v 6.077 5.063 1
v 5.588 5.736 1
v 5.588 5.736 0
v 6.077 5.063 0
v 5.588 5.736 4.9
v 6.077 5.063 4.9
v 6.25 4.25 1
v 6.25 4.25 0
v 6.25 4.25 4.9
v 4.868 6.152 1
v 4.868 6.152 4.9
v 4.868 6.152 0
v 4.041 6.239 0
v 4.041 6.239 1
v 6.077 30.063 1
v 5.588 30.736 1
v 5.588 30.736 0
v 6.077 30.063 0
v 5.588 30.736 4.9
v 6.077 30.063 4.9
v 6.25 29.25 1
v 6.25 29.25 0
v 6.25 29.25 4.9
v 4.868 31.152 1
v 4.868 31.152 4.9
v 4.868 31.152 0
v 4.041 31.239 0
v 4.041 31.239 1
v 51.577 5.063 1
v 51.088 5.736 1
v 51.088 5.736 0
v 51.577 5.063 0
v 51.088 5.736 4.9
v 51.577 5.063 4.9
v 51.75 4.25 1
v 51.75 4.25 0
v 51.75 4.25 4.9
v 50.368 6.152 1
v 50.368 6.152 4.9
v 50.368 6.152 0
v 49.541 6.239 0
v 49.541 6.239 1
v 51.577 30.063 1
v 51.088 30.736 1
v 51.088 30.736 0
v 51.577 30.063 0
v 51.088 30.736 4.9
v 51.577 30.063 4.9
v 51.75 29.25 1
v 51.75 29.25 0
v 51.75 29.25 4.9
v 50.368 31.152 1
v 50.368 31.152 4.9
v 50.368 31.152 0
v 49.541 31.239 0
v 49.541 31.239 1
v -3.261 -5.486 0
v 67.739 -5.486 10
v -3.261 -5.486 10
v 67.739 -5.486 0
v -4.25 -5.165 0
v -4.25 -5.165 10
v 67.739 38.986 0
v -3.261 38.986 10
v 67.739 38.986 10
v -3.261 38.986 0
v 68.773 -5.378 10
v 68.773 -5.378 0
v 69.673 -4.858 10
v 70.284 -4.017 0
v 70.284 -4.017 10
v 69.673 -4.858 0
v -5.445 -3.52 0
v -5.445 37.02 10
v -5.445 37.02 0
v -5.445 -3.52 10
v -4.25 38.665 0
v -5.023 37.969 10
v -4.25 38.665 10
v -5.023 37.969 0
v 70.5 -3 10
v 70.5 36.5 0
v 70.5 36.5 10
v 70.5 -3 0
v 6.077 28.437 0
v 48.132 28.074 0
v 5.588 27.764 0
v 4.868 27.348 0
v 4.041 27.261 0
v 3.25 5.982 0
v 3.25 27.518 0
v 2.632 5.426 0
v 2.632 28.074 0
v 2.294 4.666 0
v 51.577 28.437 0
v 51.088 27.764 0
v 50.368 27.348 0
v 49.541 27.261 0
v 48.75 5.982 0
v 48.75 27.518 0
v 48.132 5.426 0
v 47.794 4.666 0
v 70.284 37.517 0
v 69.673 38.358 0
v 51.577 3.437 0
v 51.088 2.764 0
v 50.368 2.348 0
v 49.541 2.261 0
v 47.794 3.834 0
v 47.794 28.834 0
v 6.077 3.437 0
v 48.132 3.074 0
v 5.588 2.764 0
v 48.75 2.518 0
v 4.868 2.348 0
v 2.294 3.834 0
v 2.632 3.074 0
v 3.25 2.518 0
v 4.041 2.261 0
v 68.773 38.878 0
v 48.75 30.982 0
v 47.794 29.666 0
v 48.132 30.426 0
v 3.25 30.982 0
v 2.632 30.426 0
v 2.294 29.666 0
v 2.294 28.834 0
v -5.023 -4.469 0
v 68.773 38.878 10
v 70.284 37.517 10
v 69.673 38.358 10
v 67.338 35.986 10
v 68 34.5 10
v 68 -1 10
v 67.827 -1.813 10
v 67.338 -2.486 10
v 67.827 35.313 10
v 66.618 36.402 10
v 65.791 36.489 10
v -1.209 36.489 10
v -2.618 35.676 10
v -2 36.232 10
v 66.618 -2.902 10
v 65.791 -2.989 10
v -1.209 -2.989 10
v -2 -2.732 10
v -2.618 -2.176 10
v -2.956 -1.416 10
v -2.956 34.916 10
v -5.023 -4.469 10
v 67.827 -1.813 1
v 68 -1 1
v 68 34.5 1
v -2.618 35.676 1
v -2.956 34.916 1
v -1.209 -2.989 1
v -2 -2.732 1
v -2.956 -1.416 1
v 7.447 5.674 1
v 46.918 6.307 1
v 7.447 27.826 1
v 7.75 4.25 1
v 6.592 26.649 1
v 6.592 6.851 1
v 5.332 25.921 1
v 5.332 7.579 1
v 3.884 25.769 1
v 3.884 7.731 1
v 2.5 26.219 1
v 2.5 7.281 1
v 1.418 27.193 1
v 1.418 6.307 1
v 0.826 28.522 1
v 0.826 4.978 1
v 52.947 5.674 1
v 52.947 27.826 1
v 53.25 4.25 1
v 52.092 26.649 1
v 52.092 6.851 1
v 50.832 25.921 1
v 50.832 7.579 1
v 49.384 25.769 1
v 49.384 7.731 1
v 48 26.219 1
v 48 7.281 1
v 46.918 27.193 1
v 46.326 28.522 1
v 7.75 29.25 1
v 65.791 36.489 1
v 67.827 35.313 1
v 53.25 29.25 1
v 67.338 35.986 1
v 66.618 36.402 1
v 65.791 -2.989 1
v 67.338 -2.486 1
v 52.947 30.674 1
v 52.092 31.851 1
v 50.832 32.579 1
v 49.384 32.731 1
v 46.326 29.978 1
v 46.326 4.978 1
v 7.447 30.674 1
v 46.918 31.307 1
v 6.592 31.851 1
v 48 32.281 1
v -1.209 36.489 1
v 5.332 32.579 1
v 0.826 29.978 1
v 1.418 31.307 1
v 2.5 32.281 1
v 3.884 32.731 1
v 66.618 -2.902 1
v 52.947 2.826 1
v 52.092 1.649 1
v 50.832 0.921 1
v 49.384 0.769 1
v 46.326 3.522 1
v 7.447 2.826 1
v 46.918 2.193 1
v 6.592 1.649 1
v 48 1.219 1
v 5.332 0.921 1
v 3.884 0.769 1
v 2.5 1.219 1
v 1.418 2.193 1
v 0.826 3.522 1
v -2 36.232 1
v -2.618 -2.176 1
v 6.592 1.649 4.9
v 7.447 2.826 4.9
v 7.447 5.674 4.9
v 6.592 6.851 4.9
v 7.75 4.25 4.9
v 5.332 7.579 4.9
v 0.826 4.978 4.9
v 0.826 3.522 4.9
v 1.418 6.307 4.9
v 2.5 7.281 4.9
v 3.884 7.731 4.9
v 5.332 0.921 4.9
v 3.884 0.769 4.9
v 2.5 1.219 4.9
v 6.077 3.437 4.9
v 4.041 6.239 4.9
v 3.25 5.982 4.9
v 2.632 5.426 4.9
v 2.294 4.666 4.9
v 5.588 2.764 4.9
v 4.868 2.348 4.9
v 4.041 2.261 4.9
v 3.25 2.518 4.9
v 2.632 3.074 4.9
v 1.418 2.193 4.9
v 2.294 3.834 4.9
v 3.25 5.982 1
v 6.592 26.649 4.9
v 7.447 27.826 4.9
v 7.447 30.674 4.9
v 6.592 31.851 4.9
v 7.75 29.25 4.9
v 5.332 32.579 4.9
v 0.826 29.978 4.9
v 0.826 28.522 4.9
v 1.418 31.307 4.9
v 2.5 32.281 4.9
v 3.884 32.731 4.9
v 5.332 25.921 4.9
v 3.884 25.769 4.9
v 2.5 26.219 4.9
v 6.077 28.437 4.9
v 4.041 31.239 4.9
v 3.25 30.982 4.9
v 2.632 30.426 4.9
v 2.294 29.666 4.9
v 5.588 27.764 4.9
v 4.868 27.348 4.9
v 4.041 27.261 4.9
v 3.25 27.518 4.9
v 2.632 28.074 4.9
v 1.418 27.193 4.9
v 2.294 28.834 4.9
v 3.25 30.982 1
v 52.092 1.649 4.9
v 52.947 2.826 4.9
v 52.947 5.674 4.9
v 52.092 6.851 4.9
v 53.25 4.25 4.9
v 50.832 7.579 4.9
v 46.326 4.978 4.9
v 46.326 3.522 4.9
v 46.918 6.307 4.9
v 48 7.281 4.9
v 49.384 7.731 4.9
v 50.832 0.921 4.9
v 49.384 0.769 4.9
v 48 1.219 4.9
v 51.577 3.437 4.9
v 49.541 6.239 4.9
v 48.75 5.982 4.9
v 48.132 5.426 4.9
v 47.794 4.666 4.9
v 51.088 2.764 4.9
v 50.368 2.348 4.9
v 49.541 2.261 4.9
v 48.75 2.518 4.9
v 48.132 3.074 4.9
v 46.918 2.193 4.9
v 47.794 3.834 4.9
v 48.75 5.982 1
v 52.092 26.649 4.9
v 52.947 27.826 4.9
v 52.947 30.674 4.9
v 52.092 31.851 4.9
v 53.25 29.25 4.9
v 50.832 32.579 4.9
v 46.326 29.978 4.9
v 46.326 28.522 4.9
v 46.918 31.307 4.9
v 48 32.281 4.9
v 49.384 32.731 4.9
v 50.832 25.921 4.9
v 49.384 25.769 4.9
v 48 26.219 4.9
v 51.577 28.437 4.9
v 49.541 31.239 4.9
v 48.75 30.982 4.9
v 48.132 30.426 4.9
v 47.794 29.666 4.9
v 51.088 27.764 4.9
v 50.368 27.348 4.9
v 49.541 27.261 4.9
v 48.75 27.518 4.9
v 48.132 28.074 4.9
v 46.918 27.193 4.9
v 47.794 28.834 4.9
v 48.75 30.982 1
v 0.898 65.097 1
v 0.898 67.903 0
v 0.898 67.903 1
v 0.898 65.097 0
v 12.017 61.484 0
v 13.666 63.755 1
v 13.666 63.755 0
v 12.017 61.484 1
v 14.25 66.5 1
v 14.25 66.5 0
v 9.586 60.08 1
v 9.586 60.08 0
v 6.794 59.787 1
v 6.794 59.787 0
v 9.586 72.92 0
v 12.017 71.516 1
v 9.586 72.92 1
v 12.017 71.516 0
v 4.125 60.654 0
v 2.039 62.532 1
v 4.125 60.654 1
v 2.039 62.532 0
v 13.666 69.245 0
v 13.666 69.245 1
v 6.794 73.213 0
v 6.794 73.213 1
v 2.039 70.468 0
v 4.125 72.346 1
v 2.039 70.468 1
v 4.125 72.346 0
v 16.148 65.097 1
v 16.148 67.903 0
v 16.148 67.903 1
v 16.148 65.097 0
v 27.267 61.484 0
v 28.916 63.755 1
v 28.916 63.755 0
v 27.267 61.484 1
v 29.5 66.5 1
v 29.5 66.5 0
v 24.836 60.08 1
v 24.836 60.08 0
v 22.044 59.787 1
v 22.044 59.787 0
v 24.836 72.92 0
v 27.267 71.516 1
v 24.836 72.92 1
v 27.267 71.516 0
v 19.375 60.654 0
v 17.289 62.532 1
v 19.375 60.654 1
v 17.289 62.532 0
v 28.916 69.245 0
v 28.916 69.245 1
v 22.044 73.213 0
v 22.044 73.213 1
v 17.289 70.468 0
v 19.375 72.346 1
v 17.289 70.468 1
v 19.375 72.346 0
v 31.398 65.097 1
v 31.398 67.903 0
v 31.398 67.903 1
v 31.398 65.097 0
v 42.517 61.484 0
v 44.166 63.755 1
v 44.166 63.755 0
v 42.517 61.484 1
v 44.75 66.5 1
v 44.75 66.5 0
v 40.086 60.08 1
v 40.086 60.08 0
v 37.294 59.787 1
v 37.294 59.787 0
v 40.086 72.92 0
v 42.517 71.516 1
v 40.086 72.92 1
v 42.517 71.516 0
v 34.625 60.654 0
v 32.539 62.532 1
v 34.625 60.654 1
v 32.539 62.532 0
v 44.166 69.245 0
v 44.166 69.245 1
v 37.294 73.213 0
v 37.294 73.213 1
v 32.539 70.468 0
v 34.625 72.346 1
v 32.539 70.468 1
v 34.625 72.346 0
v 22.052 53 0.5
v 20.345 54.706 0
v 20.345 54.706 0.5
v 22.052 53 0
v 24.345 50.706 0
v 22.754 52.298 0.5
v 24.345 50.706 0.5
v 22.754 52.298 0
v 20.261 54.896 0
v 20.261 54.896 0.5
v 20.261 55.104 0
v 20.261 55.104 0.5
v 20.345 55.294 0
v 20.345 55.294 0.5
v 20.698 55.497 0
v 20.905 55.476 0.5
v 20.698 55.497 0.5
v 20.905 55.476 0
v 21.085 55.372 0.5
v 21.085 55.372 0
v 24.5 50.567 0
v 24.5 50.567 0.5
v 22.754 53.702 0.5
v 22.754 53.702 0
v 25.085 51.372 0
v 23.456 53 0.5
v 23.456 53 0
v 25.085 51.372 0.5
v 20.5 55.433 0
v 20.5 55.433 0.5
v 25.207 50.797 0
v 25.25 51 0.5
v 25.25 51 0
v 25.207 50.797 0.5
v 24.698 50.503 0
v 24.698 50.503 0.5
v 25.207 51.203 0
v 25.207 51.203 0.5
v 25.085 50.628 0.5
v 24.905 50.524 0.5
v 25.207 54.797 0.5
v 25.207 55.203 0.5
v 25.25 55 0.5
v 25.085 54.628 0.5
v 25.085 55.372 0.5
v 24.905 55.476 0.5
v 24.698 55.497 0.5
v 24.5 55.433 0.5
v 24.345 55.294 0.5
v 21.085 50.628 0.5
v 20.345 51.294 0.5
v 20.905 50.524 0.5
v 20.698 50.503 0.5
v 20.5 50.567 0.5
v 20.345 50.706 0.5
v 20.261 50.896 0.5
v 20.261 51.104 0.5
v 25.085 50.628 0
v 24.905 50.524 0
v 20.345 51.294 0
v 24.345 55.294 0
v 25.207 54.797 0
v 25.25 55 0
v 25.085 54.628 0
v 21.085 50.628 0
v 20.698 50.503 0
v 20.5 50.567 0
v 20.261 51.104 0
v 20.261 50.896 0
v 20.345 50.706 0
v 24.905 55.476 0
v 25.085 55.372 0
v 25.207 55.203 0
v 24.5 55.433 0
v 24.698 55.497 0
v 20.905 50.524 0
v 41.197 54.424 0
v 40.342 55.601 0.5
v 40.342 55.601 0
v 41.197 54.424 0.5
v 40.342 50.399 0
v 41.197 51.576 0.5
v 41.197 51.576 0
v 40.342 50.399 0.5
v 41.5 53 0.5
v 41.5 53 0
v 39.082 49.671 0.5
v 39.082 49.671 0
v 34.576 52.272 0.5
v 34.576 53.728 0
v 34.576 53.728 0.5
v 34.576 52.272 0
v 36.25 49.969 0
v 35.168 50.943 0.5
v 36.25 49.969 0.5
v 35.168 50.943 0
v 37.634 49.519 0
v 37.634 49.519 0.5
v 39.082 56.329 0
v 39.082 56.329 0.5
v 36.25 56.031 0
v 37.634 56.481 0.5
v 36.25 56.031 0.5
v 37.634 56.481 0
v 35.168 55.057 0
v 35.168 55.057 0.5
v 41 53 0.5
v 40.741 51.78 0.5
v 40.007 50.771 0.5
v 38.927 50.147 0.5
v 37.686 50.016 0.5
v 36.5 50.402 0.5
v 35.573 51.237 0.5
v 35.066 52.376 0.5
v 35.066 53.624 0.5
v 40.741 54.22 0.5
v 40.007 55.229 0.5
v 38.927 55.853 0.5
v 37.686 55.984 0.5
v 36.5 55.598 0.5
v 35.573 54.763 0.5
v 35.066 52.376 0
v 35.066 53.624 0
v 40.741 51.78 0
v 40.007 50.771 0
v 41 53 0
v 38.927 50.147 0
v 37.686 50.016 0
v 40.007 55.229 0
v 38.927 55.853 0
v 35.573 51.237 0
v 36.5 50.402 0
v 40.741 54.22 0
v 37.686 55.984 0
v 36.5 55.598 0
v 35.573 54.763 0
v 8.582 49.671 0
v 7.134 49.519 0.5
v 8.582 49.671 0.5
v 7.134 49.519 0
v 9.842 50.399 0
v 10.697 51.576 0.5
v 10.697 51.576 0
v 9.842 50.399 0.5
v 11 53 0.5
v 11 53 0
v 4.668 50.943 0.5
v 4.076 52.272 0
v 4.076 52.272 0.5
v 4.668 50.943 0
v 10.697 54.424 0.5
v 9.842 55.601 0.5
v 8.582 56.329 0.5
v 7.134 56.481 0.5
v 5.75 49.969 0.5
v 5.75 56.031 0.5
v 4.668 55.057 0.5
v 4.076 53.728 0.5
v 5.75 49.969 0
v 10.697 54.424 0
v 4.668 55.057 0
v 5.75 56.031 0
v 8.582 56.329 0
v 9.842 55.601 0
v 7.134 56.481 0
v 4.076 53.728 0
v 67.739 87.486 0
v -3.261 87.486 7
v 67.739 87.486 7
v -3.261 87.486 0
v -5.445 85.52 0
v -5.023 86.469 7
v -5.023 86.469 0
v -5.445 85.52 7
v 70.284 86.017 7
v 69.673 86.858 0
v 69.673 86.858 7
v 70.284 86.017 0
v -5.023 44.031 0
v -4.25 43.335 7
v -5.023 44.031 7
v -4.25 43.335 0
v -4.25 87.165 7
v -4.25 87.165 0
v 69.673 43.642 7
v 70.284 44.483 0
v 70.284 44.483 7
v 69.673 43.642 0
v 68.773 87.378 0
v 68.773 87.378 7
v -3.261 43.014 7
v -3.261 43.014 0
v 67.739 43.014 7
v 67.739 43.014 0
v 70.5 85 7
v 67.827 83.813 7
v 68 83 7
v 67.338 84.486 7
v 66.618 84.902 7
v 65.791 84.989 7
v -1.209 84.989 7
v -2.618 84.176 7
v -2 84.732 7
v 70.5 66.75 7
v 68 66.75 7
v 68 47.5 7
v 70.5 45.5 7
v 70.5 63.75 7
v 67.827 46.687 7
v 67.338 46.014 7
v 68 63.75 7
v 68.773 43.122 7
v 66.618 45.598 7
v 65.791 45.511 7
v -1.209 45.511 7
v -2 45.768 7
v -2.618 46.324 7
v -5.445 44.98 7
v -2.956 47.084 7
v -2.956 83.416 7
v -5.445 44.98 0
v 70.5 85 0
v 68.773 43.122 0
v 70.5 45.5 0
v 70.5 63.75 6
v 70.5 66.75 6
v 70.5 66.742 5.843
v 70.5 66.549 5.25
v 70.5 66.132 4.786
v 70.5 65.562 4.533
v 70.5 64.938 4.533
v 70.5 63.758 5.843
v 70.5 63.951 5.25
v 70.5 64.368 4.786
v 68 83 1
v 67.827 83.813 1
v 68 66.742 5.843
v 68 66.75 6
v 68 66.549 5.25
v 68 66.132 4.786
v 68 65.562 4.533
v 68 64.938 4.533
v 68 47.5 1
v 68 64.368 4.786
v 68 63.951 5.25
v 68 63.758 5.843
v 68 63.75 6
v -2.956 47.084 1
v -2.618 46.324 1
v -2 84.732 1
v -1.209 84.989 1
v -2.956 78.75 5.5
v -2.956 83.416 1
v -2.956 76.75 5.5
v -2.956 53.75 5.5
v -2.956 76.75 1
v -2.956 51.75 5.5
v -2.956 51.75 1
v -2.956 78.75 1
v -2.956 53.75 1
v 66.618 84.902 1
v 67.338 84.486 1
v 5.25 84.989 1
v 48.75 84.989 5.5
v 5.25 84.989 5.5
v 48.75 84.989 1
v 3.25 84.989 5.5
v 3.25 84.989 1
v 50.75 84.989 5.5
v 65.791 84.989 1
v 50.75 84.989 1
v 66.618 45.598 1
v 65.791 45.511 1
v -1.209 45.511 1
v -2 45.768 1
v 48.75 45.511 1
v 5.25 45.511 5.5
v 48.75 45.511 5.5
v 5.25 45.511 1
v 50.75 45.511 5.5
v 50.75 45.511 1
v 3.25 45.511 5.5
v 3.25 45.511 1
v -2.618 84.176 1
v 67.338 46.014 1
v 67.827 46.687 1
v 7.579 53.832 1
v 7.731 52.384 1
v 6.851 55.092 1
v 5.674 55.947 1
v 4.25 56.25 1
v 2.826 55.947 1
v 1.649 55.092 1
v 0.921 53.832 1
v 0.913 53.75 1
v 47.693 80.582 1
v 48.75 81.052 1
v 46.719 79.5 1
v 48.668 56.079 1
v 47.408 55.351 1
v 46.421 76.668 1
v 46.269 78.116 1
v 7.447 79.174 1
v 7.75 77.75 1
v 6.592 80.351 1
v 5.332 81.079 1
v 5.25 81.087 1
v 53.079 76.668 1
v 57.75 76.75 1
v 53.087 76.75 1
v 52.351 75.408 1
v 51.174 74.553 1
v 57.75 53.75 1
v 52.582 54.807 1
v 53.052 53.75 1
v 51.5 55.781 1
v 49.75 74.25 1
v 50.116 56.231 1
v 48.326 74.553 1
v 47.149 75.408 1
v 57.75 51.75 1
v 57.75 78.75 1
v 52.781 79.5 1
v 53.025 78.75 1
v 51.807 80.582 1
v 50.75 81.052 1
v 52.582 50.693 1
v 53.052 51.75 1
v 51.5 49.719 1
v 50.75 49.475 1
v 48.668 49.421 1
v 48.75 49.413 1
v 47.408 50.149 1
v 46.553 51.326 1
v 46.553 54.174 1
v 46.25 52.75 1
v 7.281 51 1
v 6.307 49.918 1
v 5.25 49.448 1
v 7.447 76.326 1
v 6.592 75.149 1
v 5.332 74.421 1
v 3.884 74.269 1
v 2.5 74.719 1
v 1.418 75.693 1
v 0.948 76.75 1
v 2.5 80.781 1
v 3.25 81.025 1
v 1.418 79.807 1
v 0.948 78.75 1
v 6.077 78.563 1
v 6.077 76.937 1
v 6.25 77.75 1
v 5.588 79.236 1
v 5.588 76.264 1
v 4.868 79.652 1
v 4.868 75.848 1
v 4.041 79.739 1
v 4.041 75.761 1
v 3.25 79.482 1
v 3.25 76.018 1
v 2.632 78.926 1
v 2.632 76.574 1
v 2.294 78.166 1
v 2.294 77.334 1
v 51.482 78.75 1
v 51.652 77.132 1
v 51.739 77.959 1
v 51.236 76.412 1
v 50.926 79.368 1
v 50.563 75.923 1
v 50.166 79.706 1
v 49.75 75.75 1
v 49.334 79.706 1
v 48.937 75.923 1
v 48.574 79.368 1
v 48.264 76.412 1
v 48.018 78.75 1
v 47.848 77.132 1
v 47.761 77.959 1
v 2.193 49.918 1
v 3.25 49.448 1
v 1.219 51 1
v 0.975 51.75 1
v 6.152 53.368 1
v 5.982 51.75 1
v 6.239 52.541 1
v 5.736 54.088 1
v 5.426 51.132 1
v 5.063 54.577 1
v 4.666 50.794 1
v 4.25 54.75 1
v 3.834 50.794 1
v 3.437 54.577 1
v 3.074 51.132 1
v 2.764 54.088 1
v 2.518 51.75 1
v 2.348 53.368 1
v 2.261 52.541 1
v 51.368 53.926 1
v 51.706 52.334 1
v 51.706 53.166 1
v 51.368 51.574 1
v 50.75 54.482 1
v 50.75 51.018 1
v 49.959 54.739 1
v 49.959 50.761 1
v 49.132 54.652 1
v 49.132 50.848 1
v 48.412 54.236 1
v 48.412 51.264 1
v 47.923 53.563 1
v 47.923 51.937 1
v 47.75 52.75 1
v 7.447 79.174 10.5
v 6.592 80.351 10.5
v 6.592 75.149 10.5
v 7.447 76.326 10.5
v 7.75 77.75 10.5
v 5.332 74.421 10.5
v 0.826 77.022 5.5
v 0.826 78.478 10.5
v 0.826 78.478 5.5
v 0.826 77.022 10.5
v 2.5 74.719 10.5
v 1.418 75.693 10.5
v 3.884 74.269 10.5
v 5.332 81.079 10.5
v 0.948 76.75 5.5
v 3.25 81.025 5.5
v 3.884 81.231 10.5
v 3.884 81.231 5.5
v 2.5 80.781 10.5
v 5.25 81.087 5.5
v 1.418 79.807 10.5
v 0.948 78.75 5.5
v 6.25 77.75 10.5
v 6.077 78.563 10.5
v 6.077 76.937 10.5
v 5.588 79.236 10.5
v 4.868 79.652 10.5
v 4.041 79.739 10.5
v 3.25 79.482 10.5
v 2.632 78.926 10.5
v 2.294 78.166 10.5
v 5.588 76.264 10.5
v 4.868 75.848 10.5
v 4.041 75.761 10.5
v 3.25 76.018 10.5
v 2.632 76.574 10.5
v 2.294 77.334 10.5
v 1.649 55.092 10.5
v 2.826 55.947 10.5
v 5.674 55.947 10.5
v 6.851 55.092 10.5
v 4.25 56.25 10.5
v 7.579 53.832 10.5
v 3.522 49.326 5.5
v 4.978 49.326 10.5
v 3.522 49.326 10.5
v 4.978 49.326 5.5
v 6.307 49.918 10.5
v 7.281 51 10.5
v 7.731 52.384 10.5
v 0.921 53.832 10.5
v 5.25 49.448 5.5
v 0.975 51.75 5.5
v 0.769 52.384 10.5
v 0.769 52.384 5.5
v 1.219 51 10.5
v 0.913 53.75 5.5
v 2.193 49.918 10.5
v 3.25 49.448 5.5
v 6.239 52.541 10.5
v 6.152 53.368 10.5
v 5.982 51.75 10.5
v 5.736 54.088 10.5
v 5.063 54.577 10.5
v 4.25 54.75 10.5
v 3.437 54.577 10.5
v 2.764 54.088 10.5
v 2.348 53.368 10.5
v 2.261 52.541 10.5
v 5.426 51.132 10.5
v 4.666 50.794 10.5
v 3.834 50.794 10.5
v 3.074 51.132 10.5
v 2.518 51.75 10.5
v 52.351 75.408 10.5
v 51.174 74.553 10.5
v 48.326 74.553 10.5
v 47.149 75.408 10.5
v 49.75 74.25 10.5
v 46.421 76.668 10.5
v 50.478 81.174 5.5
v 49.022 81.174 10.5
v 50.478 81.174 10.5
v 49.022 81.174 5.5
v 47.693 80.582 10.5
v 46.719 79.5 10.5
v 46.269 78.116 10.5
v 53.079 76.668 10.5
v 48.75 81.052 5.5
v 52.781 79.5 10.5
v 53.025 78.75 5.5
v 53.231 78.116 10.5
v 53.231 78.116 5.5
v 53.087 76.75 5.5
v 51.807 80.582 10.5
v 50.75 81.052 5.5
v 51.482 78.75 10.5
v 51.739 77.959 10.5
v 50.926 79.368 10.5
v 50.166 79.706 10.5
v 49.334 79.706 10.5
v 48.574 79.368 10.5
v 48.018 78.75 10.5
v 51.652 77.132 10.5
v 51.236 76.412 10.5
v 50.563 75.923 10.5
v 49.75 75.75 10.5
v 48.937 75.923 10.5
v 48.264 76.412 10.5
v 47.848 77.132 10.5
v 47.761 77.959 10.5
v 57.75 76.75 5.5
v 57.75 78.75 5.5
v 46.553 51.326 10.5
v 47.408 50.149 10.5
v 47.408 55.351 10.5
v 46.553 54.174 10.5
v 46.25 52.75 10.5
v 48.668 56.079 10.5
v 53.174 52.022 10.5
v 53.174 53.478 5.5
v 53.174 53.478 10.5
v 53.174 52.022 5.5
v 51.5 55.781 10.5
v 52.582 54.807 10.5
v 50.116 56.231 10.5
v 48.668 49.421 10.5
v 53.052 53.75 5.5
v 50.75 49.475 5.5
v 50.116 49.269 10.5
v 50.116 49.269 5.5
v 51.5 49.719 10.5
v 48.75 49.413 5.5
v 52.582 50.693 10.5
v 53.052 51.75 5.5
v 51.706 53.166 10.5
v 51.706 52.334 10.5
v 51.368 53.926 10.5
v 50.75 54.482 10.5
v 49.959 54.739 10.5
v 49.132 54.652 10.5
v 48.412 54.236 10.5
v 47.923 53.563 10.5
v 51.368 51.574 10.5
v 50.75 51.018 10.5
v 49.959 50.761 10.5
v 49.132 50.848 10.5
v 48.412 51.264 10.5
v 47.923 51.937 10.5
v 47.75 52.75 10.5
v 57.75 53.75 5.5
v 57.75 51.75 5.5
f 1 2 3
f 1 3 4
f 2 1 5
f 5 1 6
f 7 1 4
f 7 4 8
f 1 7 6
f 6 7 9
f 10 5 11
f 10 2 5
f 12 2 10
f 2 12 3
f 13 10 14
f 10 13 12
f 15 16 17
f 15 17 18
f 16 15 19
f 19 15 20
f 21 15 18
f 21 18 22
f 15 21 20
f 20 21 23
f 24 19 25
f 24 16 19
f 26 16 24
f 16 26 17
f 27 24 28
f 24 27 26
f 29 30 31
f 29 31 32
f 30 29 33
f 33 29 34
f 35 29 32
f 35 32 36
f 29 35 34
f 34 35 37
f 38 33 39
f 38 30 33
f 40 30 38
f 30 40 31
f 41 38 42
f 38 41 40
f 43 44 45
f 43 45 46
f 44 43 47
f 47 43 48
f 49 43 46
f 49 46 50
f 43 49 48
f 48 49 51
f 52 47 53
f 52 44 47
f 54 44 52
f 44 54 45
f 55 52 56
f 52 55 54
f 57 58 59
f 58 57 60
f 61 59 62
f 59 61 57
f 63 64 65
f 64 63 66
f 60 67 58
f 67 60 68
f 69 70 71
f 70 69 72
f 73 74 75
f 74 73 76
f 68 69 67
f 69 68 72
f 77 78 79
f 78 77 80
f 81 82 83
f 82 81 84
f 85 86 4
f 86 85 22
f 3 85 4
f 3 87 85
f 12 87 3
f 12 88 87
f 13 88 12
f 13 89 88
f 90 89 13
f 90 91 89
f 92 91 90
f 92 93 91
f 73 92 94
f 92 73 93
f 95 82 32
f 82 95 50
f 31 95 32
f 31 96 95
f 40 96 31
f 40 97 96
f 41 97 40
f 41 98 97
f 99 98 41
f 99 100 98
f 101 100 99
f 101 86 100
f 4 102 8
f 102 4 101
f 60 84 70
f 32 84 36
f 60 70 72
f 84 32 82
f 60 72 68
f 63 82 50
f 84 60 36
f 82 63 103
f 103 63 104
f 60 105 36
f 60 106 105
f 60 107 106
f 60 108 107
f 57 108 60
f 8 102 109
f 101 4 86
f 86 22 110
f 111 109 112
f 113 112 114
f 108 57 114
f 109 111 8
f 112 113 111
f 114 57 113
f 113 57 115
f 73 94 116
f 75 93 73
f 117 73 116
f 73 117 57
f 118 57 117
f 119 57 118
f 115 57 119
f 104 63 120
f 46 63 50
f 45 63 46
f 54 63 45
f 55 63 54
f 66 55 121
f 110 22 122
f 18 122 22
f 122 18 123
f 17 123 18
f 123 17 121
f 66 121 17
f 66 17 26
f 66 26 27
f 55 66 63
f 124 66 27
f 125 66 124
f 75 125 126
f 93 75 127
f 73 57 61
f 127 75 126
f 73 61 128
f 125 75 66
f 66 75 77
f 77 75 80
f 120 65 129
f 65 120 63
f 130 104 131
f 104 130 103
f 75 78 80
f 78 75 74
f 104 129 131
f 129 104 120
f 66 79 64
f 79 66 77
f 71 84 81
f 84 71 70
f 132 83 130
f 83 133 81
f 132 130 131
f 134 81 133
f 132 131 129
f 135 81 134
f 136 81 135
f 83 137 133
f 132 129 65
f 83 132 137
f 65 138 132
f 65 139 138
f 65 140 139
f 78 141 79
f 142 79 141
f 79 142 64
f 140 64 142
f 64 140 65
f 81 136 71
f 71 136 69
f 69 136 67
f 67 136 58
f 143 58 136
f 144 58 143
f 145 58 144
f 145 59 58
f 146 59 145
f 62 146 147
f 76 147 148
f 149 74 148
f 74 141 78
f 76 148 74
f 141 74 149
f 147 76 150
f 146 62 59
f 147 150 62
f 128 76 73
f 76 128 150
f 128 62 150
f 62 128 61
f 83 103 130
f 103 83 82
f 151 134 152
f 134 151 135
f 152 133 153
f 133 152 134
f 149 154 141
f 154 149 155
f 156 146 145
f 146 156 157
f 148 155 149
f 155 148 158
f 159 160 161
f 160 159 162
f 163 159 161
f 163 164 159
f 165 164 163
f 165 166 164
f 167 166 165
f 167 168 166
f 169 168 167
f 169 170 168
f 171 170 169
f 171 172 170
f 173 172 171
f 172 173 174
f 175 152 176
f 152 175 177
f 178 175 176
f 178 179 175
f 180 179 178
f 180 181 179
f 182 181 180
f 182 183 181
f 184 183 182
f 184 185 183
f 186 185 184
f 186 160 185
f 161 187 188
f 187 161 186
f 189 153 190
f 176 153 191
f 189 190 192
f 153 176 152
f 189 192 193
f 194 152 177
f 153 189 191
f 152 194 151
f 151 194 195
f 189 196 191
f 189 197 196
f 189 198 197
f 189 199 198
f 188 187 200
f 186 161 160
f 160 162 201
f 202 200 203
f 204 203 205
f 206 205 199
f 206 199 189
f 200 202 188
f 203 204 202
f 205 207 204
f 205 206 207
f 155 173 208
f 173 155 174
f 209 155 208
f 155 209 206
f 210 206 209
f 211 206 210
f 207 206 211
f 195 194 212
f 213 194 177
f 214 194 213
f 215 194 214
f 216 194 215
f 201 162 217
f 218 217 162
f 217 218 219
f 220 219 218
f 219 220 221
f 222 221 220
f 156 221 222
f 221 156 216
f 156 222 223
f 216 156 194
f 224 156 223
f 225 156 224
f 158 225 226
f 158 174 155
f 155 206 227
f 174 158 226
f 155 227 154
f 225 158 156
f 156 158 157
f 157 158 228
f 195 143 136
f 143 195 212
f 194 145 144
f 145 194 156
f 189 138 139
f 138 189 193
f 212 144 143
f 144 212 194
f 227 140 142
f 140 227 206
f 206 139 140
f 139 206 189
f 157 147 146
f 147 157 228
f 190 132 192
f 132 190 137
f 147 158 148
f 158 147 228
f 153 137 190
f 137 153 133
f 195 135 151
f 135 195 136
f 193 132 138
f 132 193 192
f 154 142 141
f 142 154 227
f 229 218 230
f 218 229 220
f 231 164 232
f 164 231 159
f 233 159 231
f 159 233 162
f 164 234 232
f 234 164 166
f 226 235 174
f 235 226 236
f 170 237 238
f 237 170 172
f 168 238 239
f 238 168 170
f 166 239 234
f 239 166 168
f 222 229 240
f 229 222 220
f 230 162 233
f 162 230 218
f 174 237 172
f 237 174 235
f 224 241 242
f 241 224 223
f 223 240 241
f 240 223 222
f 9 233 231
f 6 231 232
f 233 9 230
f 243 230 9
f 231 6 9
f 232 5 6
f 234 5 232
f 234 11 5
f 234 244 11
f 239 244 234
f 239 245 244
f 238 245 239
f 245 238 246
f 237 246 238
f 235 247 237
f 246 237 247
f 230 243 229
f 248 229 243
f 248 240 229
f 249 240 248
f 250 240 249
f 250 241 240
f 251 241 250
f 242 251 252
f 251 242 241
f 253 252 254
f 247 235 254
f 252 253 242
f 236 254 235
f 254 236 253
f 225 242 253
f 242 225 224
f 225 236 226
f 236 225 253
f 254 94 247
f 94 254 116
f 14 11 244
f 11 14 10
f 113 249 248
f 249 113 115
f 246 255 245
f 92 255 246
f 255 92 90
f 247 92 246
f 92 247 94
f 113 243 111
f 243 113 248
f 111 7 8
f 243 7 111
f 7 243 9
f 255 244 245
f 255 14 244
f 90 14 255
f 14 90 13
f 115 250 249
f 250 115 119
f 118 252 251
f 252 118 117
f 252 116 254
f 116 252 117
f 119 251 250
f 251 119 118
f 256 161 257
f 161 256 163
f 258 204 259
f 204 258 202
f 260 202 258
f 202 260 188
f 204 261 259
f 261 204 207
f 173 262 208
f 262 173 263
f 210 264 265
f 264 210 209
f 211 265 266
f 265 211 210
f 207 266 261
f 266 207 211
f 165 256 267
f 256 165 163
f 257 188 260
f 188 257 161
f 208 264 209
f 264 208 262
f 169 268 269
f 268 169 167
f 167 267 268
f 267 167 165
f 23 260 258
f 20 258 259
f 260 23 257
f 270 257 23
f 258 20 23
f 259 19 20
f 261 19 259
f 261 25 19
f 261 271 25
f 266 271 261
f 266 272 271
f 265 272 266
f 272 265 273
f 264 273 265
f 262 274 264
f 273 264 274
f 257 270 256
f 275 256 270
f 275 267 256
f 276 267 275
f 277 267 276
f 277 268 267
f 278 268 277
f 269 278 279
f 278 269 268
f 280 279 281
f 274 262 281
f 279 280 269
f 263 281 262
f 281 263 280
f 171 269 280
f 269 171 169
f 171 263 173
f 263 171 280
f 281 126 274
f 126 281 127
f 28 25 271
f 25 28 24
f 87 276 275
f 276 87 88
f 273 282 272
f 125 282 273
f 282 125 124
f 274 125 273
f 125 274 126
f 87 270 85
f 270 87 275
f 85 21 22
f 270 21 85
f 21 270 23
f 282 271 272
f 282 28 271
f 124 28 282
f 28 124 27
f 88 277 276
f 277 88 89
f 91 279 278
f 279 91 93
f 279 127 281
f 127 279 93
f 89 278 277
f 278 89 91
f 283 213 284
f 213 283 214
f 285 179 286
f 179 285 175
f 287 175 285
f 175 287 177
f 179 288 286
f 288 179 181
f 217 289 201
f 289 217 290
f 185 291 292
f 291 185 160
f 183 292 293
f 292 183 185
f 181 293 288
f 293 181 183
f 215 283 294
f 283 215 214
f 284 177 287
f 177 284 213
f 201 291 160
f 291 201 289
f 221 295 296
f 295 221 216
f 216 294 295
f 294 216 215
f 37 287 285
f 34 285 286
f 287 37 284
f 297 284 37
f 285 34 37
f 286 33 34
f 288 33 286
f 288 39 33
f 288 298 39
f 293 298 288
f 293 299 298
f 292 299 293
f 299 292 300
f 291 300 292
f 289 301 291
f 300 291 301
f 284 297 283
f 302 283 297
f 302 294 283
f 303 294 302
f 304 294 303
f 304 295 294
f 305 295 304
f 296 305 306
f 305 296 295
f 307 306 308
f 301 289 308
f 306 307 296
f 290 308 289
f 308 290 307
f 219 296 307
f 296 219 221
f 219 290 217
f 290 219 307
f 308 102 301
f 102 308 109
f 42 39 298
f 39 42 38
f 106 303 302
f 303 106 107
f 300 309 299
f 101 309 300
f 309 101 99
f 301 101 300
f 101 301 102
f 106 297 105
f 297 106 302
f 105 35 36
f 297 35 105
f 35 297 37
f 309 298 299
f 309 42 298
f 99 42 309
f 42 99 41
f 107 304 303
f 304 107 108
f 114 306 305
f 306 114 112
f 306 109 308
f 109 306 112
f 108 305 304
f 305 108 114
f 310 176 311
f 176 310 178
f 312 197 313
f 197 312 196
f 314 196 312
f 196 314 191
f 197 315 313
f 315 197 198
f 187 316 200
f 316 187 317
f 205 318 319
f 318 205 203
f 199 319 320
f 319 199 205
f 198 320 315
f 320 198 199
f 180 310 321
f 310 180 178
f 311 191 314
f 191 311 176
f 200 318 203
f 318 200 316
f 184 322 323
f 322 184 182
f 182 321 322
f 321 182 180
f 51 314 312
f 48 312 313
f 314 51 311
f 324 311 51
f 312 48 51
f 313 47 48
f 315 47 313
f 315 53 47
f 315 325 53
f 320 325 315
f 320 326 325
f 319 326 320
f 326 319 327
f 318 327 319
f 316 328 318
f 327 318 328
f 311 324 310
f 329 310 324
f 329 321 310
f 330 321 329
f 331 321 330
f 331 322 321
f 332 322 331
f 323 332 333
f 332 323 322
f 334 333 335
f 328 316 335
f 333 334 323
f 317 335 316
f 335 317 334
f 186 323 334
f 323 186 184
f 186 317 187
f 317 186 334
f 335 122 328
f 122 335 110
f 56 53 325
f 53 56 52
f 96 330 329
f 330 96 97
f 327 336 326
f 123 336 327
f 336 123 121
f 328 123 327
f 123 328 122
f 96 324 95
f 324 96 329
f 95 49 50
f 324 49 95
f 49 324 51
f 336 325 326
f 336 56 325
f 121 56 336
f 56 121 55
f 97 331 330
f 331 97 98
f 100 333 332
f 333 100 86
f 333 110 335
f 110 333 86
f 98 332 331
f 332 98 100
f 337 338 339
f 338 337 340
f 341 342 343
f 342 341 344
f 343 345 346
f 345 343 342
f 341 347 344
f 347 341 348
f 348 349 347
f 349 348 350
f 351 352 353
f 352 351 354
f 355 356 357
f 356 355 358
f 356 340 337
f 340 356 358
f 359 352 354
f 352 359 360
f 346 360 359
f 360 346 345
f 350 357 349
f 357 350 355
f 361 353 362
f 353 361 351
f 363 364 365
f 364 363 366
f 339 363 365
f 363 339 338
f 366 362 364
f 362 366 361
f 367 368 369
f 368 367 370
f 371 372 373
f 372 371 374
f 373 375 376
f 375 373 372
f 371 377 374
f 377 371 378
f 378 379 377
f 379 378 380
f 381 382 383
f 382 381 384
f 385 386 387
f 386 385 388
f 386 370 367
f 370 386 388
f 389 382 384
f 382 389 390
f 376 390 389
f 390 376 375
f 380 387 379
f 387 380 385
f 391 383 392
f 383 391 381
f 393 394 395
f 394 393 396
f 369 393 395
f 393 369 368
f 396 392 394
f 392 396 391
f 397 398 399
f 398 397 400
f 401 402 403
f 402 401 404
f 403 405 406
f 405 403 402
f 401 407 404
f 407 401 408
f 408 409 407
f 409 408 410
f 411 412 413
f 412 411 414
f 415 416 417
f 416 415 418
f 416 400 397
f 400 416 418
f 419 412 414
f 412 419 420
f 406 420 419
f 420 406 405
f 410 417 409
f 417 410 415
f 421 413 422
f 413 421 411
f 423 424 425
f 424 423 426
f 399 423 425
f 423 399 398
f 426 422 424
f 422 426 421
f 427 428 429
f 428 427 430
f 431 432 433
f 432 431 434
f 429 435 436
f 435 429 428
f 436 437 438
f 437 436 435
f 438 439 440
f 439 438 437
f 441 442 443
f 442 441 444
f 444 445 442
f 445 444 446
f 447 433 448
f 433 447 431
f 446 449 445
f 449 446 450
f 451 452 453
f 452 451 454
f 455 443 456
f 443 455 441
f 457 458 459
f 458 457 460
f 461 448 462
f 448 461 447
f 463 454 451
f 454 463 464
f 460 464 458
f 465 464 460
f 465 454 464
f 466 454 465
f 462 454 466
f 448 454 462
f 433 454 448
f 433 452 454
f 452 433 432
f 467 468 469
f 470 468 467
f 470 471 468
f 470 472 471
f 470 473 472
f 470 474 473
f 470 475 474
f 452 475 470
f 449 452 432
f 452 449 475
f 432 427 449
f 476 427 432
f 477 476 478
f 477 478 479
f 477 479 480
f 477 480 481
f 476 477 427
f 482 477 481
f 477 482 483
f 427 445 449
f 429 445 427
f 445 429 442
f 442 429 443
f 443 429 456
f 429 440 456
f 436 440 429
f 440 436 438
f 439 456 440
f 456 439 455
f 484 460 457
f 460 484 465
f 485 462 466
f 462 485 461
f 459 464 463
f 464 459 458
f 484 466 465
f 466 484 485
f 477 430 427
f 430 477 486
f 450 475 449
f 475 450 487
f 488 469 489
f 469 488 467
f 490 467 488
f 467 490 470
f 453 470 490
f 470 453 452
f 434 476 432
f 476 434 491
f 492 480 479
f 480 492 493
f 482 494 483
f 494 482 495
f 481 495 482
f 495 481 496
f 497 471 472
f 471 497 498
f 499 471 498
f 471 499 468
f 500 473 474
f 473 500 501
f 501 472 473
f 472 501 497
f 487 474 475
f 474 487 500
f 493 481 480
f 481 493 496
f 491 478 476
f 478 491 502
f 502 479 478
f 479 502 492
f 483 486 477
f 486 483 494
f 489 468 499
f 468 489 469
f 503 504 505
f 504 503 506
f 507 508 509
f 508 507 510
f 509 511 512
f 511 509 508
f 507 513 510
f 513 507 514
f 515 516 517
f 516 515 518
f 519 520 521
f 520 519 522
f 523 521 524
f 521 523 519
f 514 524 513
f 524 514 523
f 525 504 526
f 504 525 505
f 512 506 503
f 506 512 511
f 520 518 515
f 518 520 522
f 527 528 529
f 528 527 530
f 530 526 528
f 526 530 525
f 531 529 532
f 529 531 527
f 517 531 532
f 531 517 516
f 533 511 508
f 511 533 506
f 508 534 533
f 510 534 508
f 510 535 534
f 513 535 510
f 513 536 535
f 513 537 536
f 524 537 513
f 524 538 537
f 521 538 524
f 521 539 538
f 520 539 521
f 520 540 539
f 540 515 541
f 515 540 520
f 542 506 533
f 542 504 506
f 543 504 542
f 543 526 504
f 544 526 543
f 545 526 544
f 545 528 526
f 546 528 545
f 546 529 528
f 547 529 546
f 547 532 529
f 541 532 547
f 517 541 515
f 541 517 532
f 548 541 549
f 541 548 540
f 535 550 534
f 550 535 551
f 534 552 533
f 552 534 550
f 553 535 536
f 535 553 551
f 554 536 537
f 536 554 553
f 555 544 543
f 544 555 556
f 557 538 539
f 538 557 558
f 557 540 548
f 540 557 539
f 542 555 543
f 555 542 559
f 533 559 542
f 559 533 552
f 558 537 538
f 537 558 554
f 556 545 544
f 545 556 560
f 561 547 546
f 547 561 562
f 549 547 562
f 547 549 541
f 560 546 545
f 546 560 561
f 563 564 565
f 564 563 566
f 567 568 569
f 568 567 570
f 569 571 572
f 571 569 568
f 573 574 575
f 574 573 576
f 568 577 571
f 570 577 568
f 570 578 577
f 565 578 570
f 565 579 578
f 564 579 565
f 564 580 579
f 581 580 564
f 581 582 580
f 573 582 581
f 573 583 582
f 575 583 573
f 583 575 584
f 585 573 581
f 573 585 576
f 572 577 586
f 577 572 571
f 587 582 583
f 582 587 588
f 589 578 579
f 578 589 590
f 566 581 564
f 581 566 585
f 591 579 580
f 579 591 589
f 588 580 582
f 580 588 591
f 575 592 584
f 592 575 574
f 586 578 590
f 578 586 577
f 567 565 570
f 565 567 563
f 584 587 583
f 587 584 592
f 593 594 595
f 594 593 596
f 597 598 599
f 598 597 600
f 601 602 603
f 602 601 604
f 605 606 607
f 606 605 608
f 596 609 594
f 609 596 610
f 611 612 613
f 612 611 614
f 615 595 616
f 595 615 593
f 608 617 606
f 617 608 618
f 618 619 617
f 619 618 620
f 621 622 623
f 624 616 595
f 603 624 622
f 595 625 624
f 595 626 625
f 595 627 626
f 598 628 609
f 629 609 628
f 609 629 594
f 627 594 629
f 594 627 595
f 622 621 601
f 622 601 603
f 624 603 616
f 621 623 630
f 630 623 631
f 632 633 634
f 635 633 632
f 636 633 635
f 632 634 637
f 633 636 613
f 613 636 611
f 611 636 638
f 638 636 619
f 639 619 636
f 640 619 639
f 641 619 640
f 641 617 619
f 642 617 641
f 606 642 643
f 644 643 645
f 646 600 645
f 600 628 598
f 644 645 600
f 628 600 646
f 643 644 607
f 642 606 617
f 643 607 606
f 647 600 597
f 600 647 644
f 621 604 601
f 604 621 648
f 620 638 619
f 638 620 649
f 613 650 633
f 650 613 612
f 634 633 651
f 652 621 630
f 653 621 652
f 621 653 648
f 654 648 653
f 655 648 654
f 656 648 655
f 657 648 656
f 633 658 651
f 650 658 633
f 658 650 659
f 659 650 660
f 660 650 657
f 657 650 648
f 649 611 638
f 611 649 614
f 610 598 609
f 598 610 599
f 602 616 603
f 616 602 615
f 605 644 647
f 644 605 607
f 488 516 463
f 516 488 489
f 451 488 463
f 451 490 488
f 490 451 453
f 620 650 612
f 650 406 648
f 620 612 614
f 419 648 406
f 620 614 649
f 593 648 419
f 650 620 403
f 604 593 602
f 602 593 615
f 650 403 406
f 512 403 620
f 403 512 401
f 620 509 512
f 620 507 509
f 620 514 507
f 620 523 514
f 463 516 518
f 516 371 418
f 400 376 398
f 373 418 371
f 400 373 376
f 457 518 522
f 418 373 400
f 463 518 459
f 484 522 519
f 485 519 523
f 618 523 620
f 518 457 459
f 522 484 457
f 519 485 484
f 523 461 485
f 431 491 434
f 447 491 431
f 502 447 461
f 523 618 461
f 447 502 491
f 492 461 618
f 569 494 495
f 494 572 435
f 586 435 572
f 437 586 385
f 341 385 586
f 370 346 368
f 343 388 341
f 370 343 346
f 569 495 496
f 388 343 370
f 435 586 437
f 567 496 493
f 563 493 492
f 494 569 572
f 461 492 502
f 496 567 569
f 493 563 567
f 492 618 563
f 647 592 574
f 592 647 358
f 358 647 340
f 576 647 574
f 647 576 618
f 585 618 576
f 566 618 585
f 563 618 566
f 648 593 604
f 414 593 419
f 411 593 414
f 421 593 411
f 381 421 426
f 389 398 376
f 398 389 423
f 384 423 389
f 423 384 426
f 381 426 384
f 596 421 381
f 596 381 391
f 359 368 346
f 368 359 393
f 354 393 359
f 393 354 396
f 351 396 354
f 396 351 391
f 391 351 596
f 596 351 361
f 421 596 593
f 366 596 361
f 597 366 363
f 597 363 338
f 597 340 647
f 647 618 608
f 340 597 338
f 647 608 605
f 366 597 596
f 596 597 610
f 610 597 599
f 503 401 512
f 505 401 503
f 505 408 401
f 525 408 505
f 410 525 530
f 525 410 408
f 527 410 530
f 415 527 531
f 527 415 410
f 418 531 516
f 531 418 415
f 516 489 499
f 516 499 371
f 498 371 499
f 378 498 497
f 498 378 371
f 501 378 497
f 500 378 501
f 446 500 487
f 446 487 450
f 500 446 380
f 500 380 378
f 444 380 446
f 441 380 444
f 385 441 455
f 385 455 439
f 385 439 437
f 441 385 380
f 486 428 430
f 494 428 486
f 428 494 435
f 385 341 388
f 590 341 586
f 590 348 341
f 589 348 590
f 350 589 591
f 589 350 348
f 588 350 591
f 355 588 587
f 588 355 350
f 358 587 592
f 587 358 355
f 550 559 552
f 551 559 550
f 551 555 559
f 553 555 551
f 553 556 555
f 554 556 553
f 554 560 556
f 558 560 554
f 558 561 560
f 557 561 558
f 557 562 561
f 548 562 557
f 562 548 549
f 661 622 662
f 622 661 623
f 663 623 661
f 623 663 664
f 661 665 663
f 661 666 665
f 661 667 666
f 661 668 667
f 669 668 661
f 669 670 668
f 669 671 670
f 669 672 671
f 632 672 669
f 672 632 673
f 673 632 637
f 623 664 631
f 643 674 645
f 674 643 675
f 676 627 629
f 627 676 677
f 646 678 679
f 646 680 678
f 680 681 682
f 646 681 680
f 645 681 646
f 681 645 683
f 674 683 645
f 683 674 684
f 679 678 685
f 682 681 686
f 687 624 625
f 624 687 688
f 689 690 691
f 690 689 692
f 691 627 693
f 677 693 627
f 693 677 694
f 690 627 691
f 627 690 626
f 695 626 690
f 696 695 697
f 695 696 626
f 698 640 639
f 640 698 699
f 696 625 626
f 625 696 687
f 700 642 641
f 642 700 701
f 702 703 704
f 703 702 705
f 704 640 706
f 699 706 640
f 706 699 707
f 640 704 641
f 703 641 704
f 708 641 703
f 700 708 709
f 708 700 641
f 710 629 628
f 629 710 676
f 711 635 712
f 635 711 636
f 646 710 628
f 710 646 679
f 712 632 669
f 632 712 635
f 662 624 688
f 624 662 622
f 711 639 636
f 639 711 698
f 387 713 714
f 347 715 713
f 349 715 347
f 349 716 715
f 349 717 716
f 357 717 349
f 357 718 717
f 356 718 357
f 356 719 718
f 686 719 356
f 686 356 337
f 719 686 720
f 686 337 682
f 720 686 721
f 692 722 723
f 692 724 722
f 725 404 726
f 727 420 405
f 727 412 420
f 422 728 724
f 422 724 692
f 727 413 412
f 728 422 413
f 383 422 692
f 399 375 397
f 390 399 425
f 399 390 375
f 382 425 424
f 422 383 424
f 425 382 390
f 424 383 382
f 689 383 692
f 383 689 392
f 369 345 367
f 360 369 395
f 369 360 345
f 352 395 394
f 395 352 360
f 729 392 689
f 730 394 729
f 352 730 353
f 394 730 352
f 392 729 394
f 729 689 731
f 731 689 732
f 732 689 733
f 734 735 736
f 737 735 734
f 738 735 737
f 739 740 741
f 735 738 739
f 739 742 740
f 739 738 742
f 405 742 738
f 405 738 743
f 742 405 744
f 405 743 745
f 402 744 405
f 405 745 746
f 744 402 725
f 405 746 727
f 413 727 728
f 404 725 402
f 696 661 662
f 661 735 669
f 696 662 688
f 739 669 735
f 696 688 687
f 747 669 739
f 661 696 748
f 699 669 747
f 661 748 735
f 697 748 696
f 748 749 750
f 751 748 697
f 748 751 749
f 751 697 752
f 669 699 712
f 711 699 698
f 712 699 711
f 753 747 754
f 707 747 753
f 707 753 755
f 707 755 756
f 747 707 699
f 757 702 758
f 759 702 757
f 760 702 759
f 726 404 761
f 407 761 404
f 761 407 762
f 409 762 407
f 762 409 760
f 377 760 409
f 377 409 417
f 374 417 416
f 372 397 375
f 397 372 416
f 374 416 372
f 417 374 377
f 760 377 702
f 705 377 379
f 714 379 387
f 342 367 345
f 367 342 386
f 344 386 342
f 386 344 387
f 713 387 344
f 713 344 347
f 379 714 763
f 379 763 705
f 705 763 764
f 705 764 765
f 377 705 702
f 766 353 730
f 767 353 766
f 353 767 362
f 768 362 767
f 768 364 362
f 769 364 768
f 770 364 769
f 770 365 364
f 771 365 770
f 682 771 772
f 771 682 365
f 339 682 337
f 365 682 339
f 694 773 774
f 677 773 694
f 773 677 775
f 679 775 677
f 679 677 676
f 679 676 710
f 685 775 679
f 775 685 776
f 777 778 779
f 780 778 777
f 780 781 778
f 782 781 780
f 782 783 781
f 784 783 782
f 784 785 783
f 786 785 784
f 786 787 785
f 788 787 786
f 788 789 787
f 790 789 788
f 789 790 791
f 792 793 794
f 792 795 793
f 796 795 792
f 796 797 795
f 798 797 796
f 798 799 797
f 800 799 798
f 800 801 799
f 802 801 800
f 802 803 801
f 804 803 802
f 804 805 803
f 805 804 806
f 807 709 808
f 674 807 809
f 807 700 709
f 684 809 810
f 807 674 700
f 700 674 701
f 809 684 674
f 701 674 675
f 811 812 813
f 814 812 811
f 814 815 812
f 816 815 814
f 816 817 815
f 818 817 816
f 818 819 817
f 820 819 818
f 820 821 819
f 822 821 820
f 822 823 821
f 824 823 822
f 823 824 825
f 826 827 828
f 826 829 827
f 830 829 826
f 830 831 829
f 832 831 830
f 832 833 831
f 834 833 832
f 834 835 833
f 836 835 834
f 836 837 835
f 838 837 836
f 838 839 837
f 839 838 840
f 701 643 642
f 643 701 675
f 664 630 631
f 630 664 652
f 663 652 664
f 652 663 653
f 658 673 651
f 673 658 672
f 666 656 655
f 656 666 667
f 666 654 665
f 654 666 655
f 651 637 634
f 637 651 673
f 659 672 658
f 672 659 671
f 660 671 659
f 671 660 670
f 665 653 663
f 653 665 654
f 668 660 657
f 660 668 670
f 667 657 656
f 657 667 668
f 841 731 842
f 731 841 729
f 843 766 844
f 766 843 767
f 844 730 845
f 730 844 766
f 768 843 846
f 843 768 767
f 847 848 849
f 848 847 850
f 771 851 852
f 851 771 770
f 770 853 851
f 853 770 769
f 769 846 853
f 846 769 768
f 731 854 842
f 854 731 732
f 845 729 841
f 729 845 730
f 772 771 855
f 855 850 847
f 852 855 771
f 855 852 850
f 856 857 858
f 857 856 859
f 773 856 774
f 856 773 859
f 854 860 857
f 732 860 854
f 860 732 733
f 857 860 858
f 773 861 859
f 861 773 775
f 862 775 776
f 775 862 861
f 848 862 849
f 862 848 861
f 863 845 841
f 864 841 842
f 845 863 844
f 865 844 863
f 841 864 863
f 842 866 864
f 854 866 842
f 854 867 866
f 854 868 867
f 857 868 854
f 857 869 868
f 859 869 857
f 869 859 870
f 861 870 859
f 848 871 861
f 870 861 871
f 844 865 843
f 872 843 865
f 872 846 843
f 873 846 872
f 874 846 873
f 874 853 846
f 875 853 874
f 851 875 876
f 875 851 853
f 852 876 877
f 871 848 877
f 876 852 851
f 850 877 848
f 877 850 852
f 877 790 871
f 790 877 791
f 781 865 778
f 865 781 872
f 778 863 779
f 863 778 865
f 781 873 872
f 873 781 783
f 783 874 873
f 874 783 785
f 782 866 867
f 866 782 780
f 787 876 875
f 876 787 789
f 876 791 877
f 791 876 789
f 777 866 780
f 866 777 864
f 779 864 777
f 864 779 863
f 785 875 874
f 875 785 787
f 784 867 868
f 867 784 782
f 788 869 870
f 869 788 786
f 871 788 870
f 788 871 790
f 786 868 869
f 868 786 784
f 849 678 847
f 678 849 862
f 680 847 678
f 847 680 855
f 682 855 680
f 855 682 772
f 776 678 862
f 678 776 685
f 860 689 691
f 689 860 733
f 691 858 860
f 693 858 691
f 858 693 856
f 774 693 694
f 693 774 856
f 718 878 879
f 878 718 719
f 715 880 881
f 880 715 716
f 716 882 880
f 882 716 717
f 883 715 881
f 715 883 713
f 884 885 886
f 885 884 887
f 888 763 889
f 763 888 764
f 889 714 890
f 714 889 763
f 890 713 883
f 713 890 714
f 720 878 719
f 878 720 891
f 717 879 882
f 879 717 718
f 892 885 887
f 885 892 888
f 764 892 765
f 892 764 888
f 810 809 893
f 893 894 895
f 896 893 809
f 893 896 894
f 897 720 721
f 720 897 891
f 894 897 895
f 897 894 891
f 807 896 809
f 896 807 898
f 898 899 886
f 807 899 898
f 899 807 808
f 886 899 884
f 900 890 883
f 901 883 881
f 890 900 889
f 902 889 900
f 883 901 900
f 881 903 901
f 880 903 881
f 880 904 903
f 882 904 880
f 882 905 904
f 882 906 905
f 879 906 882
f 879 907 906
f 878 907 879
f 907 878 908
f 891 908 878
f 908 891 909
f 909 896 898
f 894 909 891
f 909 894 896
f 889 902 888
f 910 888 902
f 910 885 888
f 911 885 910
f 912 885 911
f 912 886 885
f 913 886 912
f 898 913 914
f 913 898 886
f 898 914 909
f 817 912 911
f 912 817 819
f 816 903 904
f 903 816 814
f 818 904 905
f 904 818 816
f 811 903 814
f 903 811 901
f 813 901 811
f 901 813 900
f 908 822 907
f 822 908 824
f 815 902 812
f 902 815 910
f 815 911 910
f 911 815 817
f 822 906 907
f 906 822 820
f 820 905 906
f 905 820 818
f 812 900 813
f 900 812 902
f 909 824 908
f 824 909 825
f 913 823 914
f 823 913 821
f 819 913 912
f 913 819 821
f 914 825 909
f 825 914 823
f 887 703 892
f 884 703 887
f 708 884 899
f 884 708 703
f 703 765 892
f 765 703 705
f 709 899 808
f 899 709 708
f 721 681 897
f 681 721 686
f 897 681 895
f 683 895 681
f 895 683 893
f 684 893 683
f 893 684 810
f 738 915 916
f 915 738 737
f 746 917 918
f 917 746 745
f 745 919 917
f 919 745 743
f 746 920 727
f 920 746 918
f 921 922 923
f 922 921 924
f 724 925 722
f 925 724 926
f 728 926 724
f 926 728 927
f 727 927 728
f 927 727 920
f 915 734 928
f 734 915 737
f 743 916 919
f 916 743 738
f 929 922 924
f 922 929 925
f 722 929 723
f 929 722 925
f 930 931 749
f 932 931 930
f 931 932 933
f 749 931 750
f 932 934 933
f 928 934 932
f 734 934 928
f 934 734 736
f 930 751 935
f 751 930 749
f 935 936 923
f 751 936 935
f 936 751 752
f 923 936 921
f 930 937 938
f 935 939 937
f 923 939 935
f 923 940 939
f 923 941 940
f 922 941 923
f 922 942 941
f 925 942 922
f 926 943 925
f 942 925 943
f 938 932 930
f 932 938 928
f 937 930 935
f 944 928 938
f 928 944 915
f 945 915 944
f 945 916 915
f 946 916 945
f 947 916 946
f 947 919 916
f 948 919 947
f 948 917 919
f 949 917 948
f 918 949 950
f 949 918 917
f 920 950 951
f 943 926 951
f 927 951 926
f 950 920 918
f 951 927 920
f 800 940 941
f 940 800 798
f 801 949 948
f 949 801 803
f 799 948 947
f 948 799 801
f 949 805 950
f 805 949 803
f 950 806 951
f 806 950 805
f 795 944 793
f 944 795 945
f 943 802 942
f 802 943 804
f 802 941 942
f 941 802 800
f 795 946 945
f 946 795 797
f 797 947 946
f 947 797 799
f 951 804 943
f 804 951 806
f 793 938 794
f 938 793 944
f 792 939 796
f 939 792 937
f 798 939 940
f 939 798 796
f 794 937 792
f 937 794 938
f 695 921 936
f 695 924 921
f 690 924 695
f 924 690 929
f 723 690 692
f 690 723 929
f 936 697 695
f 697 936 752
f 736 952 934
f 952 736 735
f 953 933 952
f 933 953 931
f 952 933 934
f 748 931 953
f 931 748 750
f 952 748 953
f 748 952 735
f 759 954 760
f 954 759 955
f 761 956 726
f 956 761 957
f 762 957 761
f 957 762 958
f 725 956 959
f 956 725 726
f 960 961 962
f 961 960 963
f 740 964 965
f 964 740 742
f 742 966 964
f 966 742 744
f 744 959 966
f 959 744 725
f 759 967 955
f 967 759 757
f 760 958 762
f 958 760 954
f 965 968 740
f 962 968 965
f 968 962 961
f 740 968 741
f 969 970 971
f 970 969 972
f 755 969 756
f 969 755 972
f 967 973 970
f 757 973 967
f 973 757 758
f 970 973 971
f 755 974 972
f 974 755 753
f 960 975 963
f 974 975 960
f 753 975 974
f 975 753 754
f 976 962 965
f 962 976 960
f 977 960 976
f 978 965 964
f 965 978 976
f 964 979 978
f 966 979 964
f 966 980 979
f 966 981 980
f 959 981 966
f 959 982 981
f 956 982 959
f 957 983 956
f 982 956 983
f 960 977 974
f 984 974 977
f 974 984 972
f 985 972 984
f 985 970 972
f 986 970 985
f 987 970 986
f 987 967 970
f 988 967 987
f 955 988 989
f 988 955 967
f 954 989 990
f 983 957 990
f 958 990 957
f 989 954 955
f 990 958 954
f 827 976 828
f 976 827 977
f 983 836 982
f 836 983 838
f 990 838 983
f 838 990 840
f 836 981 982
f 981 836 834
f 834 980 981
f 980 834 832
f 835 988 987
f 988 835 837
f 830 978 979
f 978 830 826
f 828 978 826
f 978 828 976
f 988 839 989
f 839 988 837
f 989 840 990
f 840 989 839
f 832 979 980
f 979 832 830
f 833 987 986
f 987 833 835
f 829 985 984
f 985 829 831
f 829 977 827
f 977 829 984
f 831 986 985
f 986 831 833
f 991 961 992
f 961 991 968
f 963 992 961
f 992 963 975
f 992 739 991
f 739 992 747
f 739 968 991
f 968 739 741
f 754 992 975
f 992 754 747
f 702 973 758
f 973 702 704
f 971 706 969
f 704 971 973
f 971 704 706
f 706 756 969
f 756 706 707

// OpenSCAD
// file: proto-board.scad
$fn=10;

proto_board();

module proto_board() {
	width=53.5;
	height=33.5;
	thickness=1.5;

	difference() {
		footprint();
		mounting_holes();
	}

	module footprint() {
		d=11;
		hull() {
			translate([d/2,d/2,0])
			cylinder(h=thickness, d=d);

			translate([d/2,height-d/2,0])
			cylinder(h=thickness, d=d);

			translate([width-d/2,d/2,0])
			cylinder(h=thickness, d=d);

			translate([width-d/2,height-d/2,0])
			cylinder(h=thickness, d=d);
		}
	}

	module mounting_holes() {
		translate([4.25,4.25,-0.5])
		cylinder(h=thickness+1, d=3.5);

		translate([width-4.25+0.5,4.25,-0.5])
		cylinder(h=thickness+1, d=3.5);

		translate([4.25,height-4.25,-0.5])
		cylinder(h=thickness+1, d=3.5);

		translate([width-4.25+0.5,height-4.25,-0.5])
		cylinder(h=thickness+1, d=3.5);
	}
}
// file: header.scad
$fn=10;

right_angle_header(3);

module right_angle_header(num_pins=1) {
	for (i = [1:num_pins]) {
		translate([0,(i-1)*2.54,0])
		one_pin();
	}

	module one_pin() {
		pin_d=0.5;

		translate([0,0,3])
		cube([3,3,3.75]);

		translate([3/2,3/2,0])
		cylinder(h=7.5, d=pin_d);

		translate([3/2,3/2,7.5])
		rotate([0,90,0])
		cylinder(h=8, d=pin_d);

		translate([3/2,3/2,7.5])
		sphere(d=pin_d);
	}
}
// file: button.scad
$fn=10;

button();

module button() {
	overall_width=12;
	overall_thickness=16.5;

	cap();
	neck();
	base();
	legs();

	module cap() {
		cap_d1=11.5;
		cap_d2=13;
		cap_height1=5.75;
		cap_height2=1.5;

		translate([overall_width/2,overall_width/2,overall_thickness-cap_height1])
		union() {
			cylinder(d=cap_d1, h=cap_height1);
			cylinder(d=cap_d2, h=cap_height2);
		}
	}

	module neck() {
		width=3;
		translate([overall_width/2-width/2,overall_width/2-width/2,5])
		cube([width,width,overall_thickness-5]);
	}

	module base() {
		thickness=5;
		translate([0,0,3])
		cube([overall_width,overall_width,thickness]);
	}

	module legs() {
		thickness=3;
		translate([-0.5,3.5,0])
		cylinder(d=1, h=thickness+2);
		translate([-0.5,overall_width-3.5,0])
		cylinder(d=1, h=thickness+2);

		translate([overall_width+0.5,3.5,0])
		cylinder(d=1, h=thickness+2);
		translate([overall_width+0.5,overall_width-3.5,0])
		cylinder(d=1, h=thickness+2);
	}
}
// main file
use <button.scad>
use <header.scad>
use <proto-board.scad>

$fn=15;

//printer_controller();

translate([0,0,5])
lower_shell();

translate([0,82,12])
rotate([180,0,0])
upper_shell();


length=75;
lower_shell_thickness=10;
upper_shell_thickness=7;
height=33.5+10;

outer_shell_d=5;
inner_shell_d=4;

module upper_shell() {
	difference() {
		outer_shell();
		inner_shell();
		button_holes();
		cable_slot();
		indicators();
	}
	pegs();

	module outer_shell() {
		d=outer_shell_d;
		translate([-3,-3,5])
		hull() {
			translate([0,0,0])
			cylinder(h=upper_shell_thickness, d=d);
			translate([0,height-4,0])
			cylinder(h=upper_shell_thickness, d=d);
			translate([length-4,0,0])
			cylinder(h=upper_shell_thickness, d=d);
			translate([length-4,height-4,0])
			cylinder(h=upper_shell_thickness, d=d);
		}
	}

	module inner_shell() {
		d=inner_shell_d;
		translate([-3,-3,4])
		hull() {
			translate([2,2,0])
			cylinder(h=upper_shell_thickness, d=d);
			translate([2,height-4-2,0])
			cylinder(h=upper_shell_thickness, d=d);
			translate([length-4-2,2,0])
			cylinder(h=upper_shell_thickness, d=d);
			translate([length-4-2,height-4-2,0])
			cylinder(h=upper_shell_thickness, d=d);
		}
	}

	module pegs() {
		translate([4.25,4.25,1.5])
		supported_pin();

		translate([4.25,29.25,1.5])
		rotate([0,0,-90])
		supported_pin();

		translate([49.75,4.25,1.5])
		rotate([0,0,90])
		supported_pin();

		translate([49.75,29.25,1.5])
		rotate([0,0,-180])
		supported_pin();
	}

	module supported_pin() {
		peg(9.5);
		translate([-8,-1,5])
		cube([5,2,5]);
		translate([-1,-8,5])
		cube([2,5,5]);
	}

	module button_holes() {
		d=13.5;
		translate([7.5,15.5,10])
		cylinder(h=3, d=d);
		translate([22.75,15.5,10])
		cylinder(h=3, d=d);
		translate([38,15.5,10])
		cylinder(h=3, d=d);
	}

	module cable_slot() {
		translate([67,height/2-5,6])
		rotate([0,90,0])
		hull() {
			translate([0,0,0])
			cylinder(h=4, d=3);
			translate([0,-3/2,0])
			cube([3,3,4]);
		}
	}

	module indicators() {
		translate([7.5,29,11.5])
		cylinder(h=1, d=7);

		translate([22.75,29,11.5])
		union() {
			hull() {
				translate([2,2,0])
				cylinder(h=1, d=1);
				translate([-2,-2,0])
				cylinder(h=1, d=1);
			}
			hull() {
				translate([-2,2,0])
				cylinder(h=1, d=1);
				translate([2,-2,0])
				cylinder(h=1, d=1);
			}
		}
		

		translate([38,29,11.5])
		difference() {
			cylinder(h=1, d=7);
			cylinder(h=1, d=6);
		}
	}
}

module lower_shell() {
	difference() {
		outer_shell();
		inner_shell();
		screw_holes();
	}
	pegs();

	module outer_shell() {
		d=outer_shell_d;
		translate([-3,-3,-5])
		hull() {
			translate([0,0,0])
			cylinder(h=lower_shell_thickness, d=d);
			translate([0,height-4,0])
			cylinder(h=lower_shell_thickness, d=d);
			translate([length-4,0,0])
			cylinder(h=lower_shell_thickness, d=d);
			translate([length-4,height-4,0])
			cylinder(h=lower_shell_thickness, d=d);
		}
	}

	module inner_shell() {
		d=inner_shell_d;
		translate([-3,-3,-4])
		hull() {
			translate([2,2,0])
			cylinder(h=lower_shell_thickness, d=d);
			translate([2,height-4-2,0])
			cylinder(h=lower_shell_thickness, d=d);
			translate([length-4-2,2,0])
			cylinder(h=lower_shell_thickness, d=d);
			translate([length-4-2,height-4-2,0])
			cylinder(h=lower_shell_thickness, d=d);
		}
	}


	module pegs() {
		translate([4.25,4.25,-5])
		peg(4.9);

		translate([4.25,29.25,-5])
		peg(4.9);

		translate([49.75,4.25,-5])
		peg(4.9);

		translate([49.75,29.25,-5])
		peg(4.9);
	}

	module screw_holes() {
		translate([4.25,4.25,-8])
		cylinder(h=6, d=4);

		translate([4.25,29.25,-8])
		cylinder(h=6, d=4);

		translate([49.75,4.25,-8])
		cylinder(h=6, d=4);

		translate([49.75,29.25,-8])
		cylinder(h=6, d=4);
	}
}

module peg(h) {
	difference() {
		cylinder(h=h, d=7);
		translate([0,0,-0.5])
		cylinder(h=h+1, d=4);
	}
}

module bounding_box() {
	%translate([-5,-5,-5])
	cube([75,33.5+10,17]);
}

module printer_controller() {
	proto_board();
	buttons();
	header();
}

module buttons() {
	translate([1.6,9.3,-1.4])
	button();

	translate([16.75,9.3,-1.4])
	button();

	translate([32,9.3,-1.4])
	button();
}

module header() {
	translate([50.5,11.5,-1.3])
	right_angle_header(4);
}
